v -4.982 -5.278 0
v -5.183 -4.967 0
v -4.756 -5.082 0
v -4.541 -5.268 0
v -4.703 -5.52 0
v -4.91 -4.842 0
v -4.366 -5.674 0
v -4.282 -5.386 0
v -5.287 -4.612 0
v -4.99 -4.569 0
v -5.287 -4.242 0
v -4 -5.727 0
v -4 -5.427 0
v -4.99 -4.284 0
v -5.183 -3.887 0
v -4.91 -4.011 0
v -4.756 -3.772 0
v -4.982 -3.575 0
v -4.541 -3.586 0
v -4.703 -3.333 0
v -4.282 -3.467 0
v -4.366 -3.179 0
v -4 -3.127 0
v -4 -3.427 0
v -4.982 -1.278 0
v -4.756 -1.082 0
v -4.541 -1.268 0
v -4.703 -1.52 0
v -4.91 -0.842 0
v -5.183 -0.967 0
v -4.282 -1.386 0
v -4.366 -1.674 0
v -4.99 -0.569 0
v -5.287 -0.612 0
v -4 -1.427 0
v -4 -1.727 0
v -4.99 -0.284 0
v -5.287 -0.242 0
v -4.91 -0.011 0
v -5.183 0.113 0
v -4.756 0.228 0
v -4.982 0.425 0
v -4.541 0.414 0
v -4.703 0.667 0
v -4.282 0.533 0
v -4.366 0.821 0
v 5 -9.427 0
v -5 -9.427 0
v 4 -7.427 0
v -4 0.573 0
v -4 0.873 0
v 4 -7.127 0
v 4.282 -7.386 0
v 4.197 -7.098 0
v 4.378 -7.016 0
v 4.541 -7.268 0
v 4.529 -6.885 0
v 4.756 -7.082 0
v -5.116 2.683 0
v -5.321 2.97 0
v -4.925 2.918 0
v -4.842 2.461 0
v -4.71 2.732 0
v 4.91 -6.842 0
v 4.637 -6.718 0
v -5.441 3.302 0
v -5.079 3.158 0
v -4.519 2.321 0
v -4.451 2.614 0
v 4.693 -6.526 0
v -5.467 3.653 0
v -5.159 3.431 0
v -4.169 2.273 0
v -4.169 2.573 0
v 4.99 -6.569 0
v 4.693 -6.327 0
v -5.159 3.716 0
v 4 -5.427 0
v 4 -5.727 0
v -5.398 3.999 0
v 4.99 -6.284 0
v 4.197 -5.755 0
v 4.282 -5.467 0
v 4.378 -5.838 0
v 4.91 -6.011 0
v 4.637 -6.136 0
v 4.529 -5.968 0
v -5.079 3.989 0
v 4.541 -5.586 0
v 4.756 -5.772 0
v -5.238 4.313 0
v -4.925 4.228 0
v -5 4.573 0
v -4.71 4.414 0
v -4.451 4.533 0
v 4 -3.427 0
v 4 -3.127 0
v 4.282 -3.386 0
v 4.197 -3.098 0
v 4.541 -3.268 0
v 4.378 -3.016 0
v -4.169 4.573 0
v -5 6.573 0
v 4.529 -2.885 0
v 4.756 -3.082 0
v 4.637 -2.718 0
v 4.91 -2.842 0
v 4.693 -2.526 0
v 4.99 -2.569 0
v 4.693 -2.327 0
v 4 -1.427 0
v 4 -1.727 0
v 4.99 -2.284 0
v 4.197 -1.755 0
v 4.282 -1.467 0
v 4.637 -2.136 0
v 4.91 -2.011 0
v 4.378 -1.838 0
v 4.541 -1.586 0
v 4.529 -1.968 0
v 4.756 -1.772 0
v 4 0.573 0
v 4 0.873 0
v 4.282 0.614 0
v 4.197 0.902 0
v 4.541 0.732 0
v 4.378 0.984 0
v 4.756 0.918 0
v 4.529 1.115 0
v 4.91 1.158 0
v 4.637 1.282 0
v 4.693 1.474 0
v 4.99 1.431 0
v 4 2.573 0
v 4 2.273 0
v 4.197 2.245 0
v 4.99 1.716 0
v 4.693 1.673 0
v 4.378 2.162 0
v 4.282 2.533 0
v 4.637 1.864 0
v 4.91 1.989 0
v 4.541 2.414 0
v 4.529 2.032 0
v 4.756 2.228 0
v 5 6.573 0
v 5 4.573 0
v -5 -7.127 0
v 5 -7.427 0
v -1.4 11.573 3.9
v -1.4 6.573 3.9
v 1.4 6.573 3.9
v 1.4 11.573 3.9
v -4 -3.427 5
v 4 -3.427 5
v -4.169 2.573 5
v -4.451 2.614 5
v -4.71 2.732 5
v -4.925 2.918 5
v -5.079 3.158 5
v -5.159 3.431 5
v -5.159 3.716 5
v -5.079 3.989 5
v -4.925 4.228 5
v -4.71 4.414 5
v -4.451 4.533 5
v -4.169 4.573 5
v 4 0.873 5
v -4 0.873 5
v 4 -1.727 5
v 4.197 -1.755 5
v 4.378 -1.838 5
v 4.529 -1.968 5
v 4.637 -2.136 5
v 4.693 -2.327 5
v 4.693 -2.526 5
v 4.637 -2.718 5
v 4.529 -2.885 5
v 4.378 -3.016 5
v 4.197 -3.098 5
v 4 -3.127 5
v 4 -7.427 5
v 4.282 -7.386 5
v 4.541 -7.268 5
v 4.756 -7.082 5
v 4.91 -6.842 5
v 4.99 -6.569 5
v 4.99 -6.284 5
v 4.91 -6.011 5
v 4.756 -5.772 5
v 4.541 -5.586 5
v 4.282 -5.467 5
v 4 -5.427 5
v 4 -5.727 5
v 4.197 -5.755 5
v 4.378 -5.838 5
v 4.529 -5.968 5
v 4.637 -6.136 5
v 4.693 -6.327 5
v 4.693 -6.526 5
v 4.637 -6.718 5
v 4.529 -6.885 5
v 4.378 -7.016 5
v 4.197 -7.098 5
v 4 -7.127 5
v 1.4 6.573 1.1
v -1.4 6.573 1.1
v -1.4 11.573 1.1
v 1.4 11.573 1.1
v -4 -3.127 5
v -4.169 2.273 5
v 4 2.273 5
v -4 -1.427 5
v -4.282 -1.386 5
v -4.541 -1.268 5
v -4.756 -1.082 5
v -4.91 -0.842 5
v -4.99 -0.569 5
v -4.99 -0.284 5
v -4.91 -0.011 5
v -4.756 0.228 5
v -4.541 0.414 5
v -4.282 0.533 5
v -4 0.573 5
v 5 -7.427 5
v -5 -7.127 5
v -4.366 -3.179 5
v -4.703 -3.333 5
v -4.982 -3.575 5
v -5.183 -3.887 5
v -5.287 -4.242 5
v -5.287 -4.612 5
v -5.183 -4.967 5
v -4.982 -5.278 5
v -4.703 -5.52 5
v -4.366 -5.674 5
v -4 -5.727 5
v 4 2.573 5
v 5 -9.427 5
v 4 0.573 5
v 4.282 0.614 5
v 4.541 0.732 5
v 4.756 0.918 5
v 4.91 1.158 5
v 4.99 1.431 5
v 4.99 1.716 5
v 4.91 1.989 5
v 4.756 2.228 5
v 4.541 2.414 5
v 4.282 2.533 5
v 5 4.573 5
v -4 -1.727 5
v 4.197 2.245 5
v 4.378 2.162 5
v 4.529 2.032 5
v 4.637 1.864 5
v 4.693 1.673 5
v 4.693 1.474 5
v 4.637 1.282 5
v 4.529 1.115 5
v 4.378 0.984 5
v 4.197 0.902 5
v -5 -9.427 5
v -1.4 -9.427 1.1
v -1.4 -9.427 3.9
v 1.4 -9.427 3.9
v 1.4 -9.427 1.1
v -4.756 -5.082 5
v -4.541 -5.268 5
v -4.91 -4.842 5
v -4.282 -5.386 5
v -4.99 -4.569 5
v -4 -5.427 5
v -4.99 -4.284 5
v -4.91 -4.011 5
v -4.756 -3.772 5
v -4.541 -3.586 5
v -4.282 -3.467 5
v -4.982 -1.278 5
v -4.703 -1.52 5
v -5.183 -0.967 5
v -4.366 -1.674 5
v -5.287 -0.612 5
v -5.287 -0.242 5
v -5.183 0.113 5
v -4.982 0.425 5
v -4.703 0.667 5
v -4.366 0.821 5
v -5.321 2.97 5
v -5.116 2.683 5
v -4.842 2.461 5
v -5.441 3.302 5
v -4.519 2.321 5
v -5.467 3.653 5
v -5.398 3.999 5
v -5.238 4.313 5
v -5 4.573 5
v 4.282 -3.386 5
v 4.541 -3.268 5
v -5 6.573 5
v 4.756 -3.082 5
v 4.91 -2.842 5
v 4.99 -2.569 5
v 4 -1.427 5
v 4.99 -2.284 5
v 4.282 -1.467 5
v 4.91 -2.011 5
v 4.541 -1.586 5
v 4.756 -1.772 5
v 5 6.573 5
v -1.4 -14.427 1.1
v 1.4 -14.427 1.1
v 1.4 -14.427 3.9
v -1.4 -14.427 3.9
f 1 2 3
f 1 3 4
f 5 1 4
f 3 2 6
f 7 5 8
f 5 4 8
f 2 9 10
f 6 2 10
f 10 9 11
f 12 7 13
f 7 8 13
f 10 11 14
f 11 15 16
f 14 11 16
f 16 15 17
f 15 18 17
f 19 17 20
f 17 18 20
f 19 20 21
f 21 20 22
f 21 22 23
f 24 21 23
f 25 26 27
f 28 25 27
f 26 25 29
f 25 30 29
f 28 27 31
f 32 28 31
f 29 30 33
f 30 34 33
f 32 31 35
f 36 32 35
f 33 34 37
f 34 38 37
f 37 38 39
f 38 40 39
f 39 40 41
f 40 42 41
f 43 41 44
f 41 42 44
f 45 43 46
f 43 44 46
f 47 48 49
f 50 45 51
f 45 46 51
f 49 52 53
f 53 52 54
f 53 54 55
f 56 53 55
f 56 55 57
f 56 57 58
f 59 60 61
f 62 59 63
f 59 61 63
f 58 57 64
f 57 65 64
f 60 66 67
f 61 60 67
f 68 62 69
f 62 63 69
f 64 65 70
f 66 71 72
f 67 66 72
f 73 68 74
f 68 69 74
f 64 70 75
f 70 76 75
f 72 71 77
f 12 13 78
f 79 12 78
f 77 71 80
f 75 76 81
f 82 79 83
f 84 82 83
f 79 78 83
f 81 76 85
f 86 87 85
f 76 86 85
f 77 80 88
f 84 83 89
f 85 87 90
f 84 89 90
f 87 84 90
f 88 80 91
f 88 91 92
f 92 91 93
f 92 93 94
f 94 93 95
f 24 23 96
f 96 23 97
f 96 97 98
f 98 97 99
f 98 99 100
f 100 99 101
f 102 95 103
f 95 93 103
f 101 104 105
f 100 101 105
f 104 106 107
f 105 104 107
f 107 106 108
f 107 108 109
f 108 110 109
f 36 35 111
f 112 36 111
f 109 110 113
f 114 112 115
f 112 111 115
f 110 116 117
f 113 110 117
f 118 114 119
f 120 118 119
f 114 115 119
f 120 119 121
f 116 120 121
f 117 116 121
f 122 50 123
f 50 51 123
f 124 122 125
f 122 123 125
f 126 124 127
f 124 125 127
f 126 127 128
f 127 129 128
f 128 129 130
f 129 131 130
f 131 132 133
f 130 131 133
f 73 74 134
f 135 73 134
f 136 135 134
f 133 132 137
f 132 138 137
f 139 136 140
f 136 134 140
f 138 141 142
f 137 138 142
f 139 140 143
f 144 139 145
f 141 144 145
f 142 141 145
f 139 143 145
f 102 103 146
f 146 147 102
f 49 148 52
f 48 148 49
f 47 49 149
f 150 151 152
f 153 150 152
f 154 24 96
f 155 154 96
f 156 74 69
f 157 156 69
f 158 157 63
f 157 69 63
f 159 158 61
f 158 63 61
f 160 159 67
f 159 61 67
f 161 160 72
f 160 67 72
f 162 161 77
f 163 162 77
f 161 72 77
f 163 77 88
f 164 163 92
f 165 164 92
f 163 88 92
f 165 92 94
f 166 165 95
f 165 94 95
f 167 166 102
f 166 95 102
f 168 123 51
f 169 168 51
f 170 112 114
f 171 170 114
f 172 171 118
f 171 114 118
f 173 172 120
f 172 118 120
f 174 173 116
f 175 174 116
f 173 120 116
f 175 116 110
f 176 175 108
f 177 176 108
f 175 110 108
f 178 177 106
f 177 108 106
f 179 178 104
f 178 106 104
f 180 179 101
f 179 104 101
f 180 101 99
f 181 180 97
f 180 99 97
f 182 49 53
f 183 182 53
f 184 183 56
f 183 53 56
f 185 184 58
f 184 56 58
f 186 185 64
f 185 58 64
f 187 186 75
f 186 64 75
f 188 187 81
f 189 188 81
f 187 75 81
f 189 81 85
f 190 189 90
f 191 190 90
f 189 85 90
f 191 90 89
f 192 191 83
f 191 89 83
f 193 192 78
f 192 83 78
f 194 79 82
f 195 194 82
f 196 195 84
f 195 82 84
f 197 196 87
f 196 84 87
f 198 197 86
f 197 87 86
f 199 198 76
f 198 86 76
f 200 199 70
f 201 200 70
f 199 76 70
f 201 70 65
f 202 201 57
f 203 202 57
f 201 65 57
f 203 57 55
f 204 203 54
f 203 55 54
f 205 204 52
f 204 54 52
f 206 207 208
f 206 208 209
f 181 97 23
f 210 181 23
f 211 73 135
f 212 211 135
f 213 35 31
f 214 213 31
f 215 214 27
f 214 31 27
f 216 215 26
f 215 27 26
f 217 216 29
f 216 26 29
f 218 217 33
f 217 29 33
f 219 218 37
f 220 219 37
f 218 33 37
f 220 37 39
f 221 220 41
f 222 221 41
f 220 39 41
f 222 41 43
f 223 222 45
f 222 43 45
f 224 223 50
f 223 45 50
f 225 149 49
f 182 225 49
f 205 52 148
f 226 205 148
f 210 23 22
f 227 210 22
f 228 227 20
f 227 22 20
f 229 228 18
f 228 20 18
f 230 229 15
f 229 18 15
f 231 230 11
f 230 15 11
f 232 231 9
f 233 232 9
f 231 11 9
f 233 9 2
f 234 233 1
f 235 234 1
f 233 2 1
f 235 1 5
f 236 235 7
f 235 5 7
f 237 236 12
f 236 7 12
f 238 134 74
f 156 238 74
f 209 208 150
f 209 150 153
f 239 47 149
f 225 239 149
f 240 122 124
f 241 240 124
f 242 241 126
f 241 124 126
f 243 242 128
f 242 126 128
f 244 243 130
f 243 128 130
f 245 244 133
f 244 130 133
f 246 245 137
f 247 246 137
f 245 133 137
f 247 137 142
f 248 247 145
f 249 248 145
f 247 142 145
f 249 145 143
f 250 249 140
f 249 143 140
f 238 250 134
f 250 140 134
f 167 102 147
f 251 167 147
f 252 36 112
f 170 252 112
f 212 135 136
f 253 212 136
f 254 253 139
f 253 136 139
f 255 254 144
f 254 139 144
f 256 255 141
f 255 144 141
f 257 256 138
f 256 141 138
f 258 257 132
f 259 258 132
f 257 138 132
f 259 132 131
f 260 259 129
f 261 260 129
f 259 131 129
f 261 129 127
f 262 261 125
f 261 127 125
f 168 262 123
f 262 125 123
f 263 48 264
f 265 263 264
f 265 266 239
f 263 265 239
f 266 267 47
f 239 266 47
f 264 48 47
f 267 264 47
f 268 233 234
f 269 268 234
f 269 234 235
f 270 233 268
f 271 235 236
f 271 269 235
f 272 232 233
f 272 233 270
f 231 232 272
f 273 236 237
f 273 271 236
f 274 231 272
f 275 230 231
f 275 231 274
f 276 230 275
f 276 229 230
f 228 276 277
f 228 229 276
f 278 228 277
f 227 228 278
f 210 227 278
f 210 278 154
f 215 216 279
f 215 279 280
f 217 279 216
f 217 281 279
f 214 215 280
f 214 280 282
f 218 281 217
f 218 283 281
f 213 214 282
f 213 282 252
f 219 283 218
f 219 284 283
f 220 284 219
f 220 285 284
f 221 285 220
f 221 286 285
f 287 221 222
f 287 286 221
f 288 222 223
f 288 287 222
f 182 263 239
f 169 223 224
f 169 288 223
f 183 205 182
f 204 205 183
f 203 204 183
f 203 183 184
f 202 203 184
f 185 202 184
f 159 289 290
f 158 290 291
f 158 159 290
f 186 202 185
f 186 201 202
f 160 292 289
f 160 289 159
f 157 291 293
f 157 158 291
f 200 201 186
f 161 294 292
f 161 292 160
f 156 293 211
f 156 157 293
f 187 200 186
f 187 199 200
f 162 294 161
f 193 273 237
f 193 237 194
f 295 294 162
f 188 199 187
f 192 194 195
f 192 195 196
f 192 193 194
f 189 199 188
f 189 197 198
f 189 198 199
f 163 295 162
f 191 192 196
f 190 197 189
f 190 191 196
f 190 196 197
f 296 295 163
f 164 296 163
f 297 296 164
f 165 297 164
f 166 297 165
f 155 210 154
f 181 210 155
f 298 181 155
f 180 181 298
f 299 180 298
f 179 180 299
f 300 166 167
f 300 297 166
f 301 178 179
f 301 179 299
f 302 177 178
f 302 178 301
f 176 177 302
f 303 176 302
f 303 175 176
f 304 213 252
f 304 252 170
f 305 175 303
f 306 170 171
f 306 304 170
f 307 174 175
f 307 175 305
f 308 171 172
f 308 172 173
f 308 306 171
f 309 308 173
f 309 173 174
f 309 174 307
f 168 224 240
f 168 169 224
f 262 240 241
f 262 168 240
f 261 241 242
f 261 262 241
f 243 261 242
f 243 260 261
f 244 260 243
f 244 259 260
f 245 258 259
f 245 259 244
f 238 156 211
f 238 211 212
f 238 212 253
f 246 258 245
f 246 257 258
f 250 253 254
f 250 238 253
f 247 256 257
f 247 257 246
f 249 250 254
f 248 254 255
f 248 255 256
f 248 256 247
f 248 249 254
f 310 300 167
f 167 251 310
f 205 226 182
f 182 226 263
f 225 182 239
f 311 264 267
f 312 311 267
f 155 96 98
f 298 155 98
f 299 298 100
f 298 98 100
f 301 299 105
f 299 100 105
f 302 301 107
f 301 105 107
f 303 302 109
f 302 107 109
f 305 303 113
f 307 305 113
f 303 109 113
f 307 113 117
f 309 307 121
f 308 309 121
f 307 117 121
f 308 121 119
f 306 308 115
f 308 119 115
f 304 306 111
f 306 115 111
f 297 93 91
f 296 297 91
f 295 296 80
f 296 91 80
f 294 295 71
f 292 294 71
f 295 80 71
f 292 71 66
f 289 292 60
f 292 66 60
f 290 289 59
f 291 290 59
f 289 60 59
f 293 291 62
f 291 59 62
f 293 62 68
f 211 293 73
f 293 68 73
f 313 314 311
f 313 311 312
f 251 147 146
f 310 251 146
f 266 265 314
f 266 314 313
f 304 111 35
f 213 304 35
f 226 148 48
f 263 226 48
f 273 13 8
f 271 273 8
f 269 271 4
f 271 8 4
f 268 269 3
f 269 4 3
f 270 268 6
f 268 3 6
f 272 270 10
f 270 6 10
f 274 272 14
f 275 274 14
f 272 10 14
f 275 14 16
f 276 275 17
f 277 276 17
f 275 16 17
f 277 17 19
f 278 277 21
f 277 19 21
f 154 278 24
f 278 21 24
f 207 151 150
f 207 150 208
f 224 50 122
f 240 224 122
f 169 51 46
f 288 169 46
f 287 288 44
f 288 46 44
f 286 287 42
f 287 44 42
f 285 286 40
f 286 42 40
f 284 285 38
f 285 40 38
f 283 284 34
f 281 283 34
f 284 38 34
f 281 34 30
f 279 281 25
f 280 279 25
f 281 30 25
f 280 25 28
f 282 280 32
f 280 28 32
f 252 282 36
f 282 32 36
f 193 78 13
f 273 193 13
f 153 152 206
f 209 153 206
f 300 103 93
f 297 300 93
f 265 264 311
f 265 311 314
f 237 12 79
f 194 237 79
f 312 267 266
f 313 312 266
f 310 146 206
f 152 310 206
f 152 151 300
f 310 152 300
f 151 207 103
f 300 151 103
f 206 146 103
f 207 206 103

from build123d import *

# Parameters (mm, degrees)
BOSS_EXTRUDE1_DEPTH = 5
SKETCH3_W           = 2.8
SKETCH3_H           = 2.8
BOSS_EXTRUDE2_DEPTH = 5
SKETCH4_W           = 2.8
SKETCH4_H           = 2.8
BOSS_EXTRUDE3_DEPTH = 5


with BuildPart() as part:
    # Sketch2 → Boss-Extrude1 (new body)
    with BuildSketch(Plane.XY):
        with BuildLine():
            Line((4, 2.573223097), (-4.169337614, 2.573223097))
            ThreePointArc((-4.169337614, 2.573223097), (-5.169337614, 3.573223097), (-4.169337614, 4.573223097))
            Line((-4.169337614, 4.573223097), (-5, 4.573223097))
            ThreePointArc((-5, 4.573223097), (-5.39203954, 3.131635053), (-4.169337614, 2.273223097))
            Line((-4.169337614, 2.273223097), (4, 2.273223097))
            ThreePointArc((4, 2.273223097), (4.7, 1.573223097), (4, 0.873223097))
            Line((4, 0.873223097), (-4, 0.873223097))
            ThreePointArc((-4, 0.873223097), (-5.3, -0.426776903), (-4, -1.726776903))
            Line((-4, -1.726776903), (4, -1.726776903))
            ThreePointArc((4, -1.726776903), (4.7, -2.426776903), (4, -3.126776903))
            Line((4, -3.126776903), (-4, -3.126776903))
            ThreePointArc((-4, -3.126776903), (-5.3, -4.426776903), (-4, -5.726776903))
            Line((-4, -5.726776903), (4, -5.726776903))
            ThreePointArc((4, -5.726776903), (4.7, -6.426776903), (4, -7.126776903))
            Line((4, -7.126776903), (-5, -7.126776903))
            Line((-5, -7.126776903), (-5, -7.426776903))
            Line((-5, -7.426776903), (4, -7.426776903))
            ThreePointArc((4, -7.426776903), (5, -6.426776903), (4, -5.426776903))
            Line((4, -5.426776903), (-4, -5.426776903))
            ThreePointArc((-4, -5.426776903), (-5, -4.426776903), (-4, -3.426776903))
            Line((-4, -3.426776903), (4, -3.426776903))
            ThreePointArc((4, -3.426776903), (5, -2.426776903), (4, -1.426776903))
            Line((4, -1.426776903), (-4, -1.426776903))
            ThreePointArc((-4, -1.426776903), (-5, -0.426776903), (-4, 0.573223097))
            Line((-4, 0.573223097), (4, 0.573223097))
            ThreePointArc((4, 0.573223097), (5, 1.573223097), (4, 2.573223097))
        make_face()
        Polygon((-5, 4.573223097), (-4.169337614, 4.573223097), (5, 4.573223097), (5, 6.573223097), (-5, 6.573223097), align=None)
        Polygon((5, -7.426776903), (4, -7.426776903), (-5, -7.426776903), (-5, -9.426776903), (5, -9.426776903), align=None)
    extrude(amount=BOSS_EXTRUDE1_DEPTH)

    # Sketch3 → Boss-Extrude2 (add)
    with BuildSketch(Plane(origin=(0, 6.573223097, 0), x_dir=(1, 0, 0), z_dir=(0, 1, 0))):
        with Locations((0, -2.5)):
            Rectangle(SKETCH3_W, SKETCH3_H)
    extrude(amount=BOSS_EXTRUDE2_DEPTH)

    # Sketch4 → Boss-Extrude3 (add)
    with BuildSketch(Plane.XZ.offset(9.426776903)):
        with Locations((0, 2.5)):
            Rectangle(SKETCH4_W, SKETCH4_H)
    extrude(amount=BOSS_EXTRUDE3_DEPTH)


solid = part.part
